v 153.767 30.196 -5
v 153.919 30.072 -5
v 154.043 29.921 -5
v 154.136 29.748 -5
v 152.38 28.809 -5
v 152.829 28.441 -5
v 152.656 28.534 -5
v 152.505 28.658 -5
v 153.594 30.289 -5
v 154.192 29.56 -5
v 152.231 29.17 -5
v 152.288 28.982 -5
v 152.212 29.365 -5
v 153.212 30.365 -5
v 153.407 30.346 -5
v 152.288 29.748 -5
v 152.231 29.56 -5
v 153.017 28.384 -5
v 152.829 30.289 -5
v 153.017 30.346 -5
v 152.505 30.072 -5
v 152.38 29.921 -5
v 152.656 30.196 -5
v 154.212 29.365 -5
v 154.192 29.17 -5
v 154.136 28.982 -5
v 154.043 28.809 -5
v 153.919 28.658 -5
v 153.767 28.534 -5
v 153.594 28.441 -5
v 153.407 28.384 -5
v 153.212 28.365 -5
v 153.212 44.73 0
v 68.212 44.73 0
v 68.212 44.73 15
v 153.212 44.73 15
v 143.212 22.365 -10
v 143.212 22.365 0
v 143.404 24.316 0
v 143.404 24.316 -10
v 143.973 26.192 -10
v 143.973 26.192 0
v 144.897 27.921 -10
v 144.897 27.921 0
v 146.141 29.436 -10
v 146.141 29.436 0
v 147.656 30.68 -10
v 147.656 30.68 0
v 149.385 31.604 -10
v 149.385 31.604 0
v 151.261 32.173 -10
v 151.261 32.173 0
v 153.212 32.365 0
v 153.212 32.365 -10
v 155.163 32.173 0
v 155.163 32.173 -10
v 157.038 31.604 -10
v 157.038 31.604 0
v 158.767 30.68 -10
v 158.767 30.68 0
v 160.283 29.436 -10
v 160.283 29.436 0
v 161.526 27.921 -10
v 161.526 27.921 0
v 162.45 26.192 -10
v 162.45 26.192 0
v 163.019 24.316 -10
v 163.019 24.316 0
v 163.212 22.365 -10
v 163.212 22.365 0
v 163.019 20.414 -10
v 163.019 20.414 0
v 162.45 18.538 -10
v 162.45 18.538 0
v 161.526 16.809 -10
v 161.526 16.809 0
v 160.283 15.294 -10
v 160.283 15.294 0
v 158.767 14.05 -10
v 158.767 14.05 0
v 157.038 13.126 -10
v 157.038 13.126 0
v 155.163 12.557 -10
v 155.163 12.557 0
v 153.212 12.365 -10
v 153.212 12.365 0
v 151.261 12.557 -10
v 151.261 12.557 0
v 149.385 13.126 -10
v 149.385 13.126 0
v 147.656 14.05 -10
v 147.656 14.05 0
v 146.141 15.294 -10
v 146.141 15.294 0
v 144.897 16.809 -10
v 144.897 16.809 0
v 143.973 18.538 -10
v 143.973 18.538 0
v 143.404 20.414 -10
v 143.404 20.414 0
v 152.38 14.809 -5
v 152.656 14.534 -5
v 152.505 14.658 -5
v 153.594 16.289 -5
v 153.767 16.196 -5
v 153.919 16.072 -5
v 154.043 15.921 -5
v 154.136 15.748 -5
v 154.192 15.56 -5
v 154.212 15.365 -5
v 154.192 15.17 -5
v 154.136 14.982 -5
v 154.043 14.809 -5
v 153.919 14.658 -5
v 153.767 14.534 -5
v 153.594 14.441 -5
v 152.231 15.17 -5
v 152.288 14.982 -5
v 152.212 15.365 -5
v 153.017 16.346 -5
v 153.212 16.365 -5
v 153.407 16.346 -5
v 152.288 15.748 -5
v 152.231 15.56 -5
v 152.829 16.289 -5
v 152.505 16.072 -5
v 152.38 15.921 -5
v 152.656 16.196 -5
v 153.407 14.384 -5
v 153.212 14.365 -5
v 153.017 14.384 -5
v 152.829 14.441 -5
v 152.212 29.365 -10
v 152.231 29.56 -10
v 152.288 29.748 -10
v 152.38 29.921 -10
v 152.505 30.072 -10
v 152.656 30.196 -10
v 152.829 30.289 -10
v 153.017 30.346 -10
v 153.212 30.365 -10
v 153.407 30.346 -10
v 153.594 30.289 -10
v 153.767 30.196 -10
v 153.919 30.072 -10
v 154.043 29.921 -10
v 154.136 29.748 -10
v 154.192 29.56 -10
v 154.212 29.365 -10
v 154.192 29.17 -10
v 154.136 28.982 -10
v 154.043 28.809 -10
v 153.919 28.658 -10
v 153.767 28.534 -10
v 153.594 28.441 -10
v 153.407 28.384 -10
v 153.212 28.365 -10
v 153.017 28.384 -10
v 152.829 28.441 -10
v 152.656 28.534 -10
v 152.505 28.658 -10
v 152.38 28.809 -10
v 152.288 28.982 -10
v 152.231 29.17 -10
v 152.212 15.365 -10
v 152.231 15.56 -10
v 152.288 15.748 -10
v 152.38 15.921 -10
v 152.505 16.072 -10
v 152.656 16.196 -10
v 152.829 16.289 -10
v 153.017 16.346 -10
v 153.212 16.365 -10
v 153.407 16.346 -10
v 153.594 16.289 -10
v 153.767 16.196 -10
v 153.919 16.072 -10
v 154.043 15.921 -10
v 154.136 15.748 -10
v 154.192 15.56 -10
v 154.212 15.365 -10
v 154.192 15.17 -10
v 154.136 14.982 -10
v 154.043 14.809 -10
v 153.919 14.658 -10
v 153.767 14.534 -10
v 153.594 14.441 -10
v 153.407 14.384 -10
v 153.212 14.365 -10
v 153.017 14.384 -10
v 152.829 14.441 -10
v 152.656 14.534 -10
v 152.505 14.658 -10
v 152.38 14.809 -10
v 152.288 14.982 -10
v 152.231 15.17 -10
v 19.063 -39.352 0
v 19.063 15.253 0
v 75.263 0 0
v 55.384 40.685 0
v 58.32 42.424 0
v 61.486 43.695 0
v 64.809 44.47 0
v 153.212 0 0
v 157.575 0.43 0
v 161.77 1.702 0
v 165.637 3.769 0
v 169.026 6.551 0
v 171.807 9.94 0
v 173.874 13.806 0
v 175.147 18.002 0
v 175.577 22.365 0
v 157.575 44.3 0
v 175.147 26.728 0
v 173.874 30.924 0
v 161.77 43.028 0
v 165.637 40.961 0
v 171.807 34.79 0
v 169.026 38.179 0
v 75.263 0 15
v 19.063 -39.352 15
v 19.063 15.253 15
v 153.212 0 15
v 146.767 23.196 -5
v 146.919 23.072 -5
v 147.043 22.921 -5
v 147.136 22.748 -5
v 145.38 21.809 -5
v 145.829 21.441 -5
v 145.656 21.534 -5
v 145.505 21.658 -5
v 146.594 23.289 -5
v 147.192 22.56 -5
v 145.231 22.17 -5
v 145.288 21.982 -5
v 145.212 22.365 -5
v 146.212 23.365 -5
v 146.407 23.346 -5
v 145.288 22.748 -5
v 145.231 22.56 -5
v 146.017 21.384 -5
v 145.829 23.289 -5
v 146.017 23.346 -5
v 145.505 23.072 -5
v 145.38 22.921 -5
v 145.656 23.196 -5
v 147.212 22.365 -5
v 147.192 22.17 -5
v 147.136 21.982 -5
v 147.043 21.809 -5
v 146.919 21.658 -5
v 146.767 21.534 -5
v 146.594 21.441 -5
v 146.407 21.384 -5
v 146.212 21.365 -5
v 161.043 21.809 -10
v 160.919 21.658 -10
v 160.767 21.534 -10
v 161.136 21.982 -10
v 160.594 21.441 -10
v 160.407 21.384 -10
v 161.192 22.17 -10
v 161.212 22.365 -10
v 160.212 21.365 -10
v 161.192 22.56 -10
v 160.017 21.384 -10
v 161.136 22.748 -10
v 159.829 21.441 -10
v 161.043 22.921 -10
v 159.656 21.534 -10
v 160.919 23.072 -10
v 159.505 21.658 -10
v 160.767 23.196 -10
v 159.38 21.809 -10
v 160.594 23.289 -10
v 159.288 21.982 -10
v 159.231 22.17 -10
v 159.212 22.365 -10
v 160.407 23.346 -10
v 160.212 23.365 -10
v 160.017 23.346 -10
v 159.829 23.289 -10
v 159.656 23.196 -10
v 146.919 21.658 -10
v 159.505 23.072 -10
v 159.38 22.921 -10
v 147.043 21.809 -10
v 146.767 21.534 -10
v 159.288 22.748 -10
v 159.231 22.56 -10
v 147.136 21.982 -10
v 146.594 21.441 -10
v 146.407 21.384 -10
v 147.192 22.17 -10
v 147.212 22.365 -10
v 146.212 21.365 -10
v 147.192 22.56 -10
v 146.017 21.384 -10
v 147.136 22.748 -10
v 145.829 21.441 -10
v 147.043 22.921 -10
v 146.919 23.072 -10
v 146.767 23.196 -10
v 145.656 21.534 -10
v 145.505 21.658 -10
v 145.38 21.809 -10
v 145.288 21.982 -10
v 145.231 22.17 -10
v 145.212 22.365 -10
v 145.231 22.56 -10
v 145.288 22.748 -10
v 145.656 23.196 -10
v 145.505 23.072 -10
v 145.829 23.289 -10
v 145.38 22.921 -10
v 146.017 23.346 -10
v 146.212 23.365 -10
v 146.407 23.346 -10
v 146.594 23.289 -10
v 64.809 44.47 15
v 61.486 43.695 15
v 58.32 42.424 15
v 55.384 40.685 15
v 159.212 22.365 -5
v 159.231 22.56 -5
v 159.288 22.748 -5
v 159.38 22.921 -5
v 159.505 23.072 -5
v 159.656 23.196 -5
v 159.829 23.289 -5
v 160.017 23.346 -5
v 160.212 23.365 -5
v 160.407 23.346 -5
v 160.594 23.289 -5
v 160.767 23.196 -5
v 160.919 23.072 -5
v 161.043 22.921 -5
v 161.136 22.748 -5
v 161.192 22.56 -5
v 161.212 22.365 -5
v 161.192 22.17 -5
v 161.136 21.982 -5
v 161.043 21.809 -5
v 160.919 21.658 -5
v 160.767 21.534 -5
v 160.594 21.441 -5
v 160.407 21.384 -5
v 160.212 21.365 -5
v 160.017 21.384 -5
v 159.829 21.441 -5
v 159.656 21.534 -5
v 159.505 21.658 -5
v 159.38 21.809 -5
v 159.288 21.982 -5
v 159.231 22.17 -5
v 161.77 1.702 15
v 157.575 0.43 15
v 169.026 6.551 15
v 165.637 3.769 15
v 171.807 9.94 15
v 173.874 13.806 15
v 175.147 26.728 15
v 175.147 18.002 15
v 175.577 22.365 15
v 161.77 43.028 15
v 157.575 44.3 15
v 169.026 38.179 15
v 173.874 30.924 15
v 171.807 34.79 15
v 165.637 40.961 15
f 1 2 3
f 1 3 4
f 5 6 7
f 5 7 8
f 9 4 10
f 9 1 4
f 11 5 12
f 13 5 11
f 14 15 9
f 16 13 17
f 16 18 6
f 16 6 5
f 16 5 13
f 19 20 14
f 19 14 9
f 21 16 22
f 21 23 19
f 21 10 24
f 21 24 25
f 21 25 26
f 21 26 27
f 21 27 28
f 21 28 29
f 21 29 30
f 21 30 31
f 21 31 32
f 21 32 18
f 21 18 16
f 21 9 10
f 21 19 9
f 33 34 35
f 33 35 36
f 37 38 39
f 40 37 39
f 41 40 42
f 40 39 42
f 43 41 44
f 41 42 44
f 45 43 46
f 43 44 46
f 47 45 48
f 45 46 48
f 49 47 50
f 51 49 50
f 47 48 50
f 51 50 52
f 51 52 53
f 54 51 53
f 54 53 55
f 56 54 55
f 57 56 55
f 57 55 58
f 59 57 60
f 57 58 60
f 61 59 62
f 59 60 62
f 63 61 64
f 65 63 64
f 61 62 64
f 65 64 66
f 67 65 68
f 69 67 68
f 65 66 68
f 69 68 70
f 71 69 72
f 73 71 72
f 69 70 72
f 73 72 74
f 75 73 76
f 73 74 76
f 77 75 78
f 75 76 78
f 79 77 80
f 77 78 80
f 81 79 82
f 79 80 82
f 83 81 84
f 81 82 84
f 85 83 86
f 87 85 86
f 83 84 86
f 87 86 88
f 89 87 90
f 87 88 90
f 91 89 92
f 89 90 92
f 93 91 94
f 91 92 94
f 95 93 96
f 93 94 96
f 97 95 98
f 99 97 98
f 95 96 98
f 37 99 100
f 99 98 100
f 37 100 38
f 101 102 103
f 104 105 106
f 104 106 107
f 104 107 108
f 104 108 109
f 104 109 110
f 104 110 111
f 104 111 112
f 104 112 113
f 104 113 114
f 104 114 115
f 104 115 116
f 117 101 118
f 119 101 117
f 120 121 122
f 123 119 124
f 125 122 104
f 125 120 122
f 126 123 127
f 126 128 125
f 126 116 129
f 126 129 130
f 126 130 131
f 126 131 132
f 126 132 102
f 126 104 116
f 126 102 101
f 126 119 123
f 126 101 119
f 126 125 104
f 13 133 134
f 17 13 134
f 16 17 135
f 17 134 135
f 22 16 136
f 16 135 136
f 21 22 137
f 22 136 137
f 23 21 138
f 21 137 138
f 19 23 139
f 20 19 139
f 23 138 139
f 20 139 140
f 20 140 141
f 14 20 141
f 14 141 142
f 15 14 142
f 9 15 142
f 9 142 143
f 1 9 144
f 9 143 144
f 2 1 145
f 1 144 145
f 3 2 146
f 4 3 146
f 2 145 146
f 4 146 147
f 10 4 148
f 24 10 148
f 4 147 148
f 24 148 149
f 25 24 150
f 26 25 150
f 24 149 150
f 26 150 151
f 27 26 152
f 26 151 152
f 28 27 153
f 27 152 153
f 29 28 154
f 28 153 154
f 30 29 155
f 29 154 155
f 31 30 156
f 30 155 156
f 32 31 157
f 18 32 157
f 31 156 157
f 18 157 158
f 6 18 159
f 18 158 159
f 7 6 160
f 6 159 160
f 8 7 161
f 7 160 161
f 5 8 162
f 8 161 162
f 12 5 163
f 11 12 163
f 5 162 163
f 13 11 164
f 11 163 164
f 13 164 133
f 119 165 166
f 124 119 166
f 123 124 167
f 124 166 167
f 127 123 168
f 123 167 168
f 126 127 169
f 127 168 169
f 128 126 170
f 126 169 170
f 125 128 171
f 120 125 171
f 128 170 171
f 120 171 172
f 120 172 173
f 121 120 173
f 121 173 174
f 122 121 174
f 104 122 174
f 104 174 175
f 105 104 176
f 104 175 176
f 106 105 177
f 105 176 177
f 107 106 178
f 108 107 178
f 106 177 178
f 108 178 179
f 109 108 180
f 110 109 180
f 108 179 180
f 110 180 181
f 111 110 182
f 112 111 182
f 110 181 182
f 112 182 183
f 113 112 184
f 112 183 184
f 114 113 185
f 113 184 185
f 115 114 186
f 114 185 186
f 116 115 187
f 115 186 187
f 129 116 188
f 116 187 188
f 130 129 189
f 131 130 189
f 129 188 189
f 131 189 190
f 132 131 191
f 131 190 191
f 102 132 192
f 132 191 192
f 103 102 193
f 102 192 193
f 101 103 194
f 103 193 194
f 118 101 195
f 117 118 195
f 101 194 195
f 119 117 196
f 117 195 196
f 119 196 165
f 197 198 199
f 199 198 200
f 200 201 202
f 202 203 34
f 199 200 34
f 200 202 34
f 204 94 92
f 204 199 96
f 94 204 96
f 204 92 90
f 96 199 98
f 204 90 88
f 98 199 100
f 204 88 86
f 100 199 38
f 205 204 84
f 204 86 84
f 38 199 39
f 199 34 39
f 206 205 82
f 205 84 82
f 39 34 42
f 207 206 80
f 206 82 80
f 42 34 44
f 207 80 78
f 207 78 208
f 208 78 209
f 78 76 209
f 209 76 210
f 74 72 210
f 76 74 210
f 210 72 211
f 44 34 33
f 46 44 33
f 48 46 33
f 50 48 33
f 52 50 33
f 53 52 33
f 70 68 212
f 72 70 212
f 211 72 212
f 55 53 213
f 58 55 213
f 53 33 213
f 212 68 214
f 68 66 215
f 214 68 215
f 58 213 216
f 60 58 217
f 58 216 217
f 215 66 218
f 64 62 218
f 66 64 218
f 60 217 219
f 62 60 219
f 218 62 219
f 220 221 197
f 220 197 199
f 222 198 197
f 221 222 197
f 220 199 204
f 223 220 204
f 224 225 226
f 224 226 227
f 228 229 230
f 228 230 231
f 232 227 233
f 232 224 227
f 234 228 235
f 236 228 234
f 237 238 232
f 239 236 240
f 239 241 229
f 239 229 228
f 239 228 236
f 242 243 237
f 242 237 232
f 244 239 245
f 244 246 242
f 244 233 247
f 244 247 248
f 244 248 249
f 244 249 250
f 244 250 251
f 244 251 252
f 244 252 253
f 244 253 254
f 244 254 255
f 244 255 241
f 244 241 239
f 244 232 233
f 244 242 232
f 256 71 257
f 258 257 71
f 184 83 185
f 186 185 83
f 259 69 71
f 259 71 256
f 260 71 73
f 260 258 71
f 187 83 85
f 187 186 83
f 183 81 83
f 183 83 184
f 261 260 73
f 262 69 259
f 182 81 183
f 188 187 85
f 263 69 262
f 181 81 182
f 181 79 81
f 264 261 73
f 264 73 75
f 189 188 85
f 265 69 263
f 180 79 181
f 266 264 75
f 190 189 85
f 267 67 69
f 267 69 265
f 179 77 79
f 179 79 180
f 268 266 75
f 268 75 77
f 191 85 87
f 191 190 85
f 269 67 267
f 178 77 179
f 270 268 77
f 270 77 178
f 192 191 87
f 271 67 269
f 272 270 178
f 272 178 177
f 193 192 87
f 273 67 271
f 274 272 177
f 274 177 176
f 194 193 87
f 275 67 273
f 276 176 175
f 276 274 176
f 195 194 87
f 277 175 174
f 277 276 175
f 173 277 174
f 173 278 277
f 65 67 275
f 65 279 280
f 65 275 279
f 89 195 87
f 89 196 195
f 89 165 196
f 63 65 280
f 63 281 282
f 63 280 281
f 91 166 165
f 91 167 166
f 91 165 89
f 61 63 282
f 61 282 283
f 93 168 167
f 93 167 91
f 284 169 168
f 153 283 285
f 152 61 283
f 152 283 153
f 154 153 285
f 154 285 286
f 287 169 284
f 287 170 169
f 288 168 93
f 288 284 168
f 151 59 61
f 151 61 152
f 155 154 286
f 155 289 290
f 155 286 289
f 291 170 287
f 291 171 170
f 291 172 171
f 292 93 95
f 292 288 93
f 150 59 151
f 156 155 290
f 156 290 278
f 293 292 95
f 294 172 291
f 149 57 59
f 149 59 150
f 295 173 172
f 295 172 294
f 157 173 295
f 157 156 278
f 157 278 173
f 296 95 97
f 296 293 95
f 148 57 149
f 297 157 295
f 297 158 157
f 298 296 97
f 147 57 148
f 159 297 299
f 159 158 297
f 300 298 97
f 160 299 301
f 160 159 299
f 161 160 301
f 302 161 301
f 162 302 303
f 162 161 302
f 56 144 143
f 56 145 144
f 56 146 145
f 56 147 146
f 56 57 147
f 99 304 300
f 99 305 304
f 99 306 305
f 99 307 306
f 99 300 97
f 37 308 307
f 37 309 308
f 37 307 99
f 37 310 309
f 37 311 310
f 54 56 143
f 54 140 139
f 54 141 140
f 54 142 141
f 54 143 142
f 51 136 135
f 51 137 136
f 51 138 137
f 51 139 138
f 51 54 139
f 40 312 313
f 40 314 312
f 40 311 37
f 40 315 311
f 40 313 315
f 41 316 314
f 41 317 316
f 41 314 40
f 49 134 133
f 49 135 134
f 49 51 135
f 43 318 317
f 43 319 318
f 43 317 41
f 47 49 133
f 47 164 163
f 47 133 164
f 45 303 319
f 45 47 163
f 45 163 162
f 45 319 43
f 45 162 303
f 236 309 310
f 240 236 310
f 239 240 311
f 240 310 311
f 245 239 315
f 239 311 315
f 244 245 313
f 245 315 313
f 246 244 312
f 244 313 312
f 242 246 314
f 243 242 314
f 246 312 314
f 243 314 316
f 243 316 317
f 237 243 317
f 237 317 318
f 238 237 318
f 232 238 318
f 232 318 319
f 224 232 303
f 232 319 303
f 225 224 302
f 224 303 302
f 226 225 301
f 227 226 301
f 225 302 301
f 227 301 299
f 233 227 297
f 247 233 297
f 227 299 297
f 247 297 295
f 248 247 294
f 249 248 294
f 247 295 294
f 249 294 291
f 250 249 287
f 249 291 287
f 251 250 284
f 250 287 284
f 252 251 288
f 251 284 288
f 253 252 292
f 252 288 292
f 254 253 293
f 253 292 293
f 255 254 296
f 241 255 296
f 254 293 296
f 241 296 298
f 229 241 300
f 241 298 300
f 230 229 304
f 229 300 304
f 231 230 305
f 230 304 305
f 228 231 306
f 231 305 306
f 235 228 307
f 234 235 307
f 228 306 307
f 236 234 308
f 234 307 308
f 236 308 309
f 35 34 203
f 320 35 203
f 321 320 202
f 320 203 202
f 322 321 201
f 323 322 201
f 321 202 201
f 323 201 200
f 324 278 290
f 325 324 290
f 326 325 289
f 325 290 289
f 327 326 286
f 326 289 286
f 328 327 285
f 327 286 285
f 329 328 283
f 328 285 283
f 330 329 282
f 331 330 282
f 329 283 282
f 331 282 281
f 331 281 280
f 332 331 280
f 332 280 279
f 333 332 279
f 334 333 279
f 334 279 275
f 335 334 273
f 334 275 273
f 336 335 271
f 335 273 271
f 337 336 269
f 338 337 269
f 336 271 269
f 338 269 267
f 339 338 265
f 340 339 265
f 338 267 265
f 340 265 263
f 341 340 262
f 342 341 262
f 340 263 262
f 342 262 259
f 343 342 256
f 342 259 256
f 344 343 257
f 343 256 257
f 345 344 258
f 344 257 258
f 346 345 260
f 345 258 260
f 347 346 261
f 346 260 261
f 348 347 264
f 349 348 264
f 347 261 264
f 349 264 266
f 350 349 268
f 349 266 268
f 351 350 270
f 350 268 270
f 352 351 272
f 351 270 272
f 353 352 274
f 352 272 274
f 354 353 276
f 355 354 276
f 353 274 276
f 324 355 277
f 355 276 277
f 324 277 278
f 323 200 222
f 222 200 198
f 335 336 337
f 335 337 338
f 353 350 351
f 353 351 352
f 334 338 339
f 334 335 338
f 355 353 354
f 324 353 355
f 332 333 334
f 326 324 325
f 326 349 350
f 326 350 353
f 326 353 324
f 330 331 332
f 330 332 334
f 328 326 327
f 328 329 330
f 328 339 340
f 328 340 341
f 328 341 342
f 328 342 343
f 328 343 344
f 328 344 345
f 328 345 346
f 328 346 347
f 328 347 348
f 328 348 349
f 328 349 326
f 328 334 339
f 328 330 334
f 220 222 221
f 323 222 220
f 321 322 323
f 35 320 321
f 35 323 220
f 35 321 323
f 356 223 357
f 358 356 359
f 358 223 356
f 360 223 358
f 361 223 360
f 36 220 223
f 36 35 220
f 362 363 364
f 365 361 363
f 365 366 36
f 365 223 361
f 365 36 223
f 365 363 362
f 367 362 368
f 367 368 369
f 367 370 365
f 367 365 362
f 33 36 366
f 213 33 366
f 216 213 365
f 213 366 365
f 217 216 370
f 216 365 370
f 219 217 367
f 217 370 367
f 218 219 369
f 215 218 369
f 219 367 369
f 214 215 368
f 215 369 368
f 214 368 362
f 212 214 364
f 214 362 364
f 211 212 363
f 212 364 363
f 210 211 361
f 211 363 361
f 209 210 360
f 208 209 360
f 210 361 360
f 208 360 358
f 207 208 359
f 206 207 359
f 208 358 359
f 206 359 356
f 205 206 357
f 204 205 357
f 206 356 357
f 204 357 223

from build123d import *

# Parameters (mm, degrees)
SKETCH_1_W          = 300
SKETCH_1_H          = 44.73
EXTRUDE_1_DEPTH     = 15
CUT_EXTRUDE_4_REACH = 305.687
SKETCH_6_R          = 10
EXTRUDE_2_DEPTH     = 10
SKETCH_7_R          = 1
CUT_EXTRUDE_6_DEPTH = 5
EXTRUDE_START       = 15
EXTRUDE_5_DEPTH     = 15
CUT_EXTRUDE_7_DEPTH = 15


with BuildPart() as part:
    # 草图1 → 凸台-拉伸1 (new body)
    with BuildSketch(Plane.XY):
        with Locations((150, 22.365)):
            Rectangle(SKETCH_1_W, SKETCH_1_H)
    extrude(amount=EXTRUDE_1_DEPTH)

    # 草图4 → 切除-拉伸4 (cut, up to next)
    with BuildSketch(Plane.XY.offset(15), mode=Mode.PRIVATE) as cut_extrude_4_sk1:
        with BuildLine():
            Line((300, 44.73), (153.211623388, 44.73))
            ThreePointArc((153.211623388, 44.73), (175.576623388, 22.365), (153.211623388, 0))
            Line((153.211623388, 0), (300, 0))
            Line((300, 0), (300, 44.73))
        make_face()
    cut_extrude_4_tool1 = extrude(cut_extrude_4_sk1.sketch, amount=-CUT_EXTRUDE_4_REACH, mode=Mode.PRIVATE) & part.part
    add(cut_extrude_4_tool1.solids().sort_by_distance((235.292113, 22.365, 15))[0], mode=Mode.SUBTRACT)

    # 草图6 → 凸台-拉伸2 (add)
    with BuildSketch(Plane(origin=(0, 0, 0), x_dir=(-1, 0, 0), z_dir=(0, 0, -1))):
        with Locations((-153.211623388, 22.365)):
            Circle(SKETCH_6_R)
    extrude(amount=EXTRUDE_2_DEPTH)

    # 草图7 → 切除-拉伸6 (cut)
    with BuildSketch(Plane(origin=(0, 0, -10), x_dir=(-1, 0, 0), z_dir=(0, 0, -1))):
        with Locations((-153.211623388, 29.365)):
            Circle(SKETCH_7_R)
        with Locations((-146.211623388, 22.365)):
            Circle(SKETCH_7_R)
        with Locations((-153.211623388, 15.365)):
            Circle(SKETCH_7_R)
        with Locations((-160.211623388, 22.365)):
            Circle(SKETCH_7_R)
    extrude(amount=-CUT_EXTRUDE_6_DEPTH, mode=Mode.SUBTRACT)

    # 草图9 → 凸台-拉伸5 (add)
    # profile 1 of 8: a face of its own
    with BuildSketch(Plane.XY.offset(EXTRUDE_START)):
        with BuildLine():
            ThreePointArc((49.891287917, 9.536963001), (46.186397992, 26.248641494), (55.383586389, 40.685335471))
            Line((55.383586389, 40.685335471), (19.062500731, 15.253037497))
            Line((19.062500731, 15.253037497), (19.062500731, -12.049586181))
            Line((19.062500731, -12.049586181), (49.891287917, 9.536963001))
        make_face()
    # profile 2 of 8: a face of its own
    with BuildSketch(Plane.XY.offset(EXTRUDE_START)):
        with BuildLine():
            ThreePointArc((68.211623388, 0), (57.884615653, 2.527002716), (49.891287917, 9.536963001))
            Line((49.891287917, 9.536963001), (19.062500731, -12.049586181))
            Line((19.062500731, -12.049586181), (19.062500731, -39.352209859))
            Line((19.062500731, -39.352209859), (75.263280801, 0))
            Line((75.263280801, 0), (68.211623388, 0))
        make_face()
    # profile 3 of 8: a face of its own
    with BuildSketch(Plane.XY.offset(EXTRUDE_START)):
        with BuildLine():
            ThreePointArc((90.576623388, 22.365), (84.026066549, 38.179443161), (68.211623388, 44.73))
            ThreePointArc((68.211623388, 44.73), (61.486338182, 43.694879603), (55.383586389, 40.685335471))
            ThreePointArc((55.383586389, 40.685335471), (46.186397992, 26.248641494), (49.891287917, 9.536963001))
            Line((49.891287917, 9.536963001), (68.211623388, 22.365))
            Line((68.211623388, 22.365), (90.576623388, 22.365))
        make_face()
    # profile 4 of 8: a face of its own
    with BuildSketch(Plane.XY.offset(EXTRUDE_START)):
        with BuildLine():
            ThreePointArc((81.039660387, 4.044664529), (88.049620672, 12.037992265), (90.576623388, 22.365))
            Line((90.576623388, 22.365), (68.211623388, 22.365))
            Line((68.211623388, 22.365), (49.891287917, 9.536963001))
            ThreePointArc((49.891287917, 9.536963001), (57.884615653, 2.527002716), (68.211623388, 0))
            ThreePointArc((68.211623388, 0), (74.936908594, 1.035120397), (81.039660387, 4.044664529))
        make_face()
    # profile 5 of 8: a face of its own
    with BuildSketch(Plane.XY.offset(EXTRUDE_START)):
        with BuildLine():
            ThreePointArc((153.211623388, 0), (137.397180227, 6.550556839), (130.846623388, 22.365))
            Line((130.846623388, 22.365), (90.576623388, 22.365))
            ThreePointArc((90.576623388, 22.365), (88.049620672, 12.037992265), (81.039660387, 4.044664529))
            Line((81.039660387, 4.044664529), (75.263280801, 0))
            Line((75.263280801, 0), (153.211623388, 0))
        make_face()
    # profile 6 of 8: a face of its own
    with BuildSketch(Plane.XY.offset(EXTRUDE_START)):
        with BuildLine():
            ThreePointArc((130.846623388, 22.365), (137.397180227, 38.179443161), (153.211623388, 44.73))
            Line((153.211623388, 44.73), (68.211623388, 44.73))
            ThreePointArc((68.211623388, 44.73), (84.026066549, 38.179443161), (90.576623388, 22.365))
            Line((90.576623388, 22.365), (130.846623388, 22.365))
        make_face()
    # profile 7 of 8: a face of its own
    with BuildSketch(Plane.XY.offset(EXTRUDE_START)):
        with BuildLine():
            ThreePointArc((175.576623388, 22.365), (169.026066549, 38.179443161), (153.211623388, 44.73))
            ThreePointArc((153.211623388, 44.73), (137.397180227, 38.179443161), (130.846623388, 22.365))
            ThreePointArc((130.846623388, 22.365), (137.397180227, 6.550556839), (153.211623388, 0))
            ThreePointArc((153.211623388, 0), (169.026066549, 6.550556839), (175.576623388, 22.365))
        make_face()
        with BuildLine():
            ThreePointArc((163.211623388, 22.365), (153.211623388, 12.365), (143.211623388, 22.365))
            ThreePointArc((143.211623388, 22.365), (153.211623388, 32.365), (163.211623388, 22.365))
        make_face(mode=Mode.SUBTRACT)
    # profile 8 of 8: a face of its own
    with BuildSketch(Plane.XY.offset(EXTRUDE_START)):
        with BuildLine():
            Line((75.263280801, 0), (81.039660387, 4.044664529))
            ThreePointArc((81.039660387, 4.044664529), (74.936908594, 1.035120397), (68.211623388, 0))
            Line((68.211623388, 0), (75.263280801, 0))
        make_face()
    extrude(amount=-EXTRUDE_5_DEPTH)

    # 草图10 → 切除-拉伸7 (cut)
    with BuildSketch(Plane(origin=(0, 0, 0), x_dir=(-1, 0, 0), z_dir=(0, 0, -1))):
        with BuildLine():
            Line((-19.062500731, 15.253037497), (-19.062500731, 0))
            Line((-19.062500731, 0), (0, 0))
            Line((0, 0), (0, 44.73))
            Line((0, 44.73), (-68.211623388, 44.73))
            ThreePointArc((-68.211623388, 44.73), (-61.486338182, 43.694879603), (-55.383586389, 40.685335471))
            Line((-55.383586389, 40.685335471), (-19.062500731, 15.253037497))
        make_face()
    extrude(amount=-CUT_EXTRUDE_7_DEPTH, mode=Mode.SUBTRACT)


solid = part.part
